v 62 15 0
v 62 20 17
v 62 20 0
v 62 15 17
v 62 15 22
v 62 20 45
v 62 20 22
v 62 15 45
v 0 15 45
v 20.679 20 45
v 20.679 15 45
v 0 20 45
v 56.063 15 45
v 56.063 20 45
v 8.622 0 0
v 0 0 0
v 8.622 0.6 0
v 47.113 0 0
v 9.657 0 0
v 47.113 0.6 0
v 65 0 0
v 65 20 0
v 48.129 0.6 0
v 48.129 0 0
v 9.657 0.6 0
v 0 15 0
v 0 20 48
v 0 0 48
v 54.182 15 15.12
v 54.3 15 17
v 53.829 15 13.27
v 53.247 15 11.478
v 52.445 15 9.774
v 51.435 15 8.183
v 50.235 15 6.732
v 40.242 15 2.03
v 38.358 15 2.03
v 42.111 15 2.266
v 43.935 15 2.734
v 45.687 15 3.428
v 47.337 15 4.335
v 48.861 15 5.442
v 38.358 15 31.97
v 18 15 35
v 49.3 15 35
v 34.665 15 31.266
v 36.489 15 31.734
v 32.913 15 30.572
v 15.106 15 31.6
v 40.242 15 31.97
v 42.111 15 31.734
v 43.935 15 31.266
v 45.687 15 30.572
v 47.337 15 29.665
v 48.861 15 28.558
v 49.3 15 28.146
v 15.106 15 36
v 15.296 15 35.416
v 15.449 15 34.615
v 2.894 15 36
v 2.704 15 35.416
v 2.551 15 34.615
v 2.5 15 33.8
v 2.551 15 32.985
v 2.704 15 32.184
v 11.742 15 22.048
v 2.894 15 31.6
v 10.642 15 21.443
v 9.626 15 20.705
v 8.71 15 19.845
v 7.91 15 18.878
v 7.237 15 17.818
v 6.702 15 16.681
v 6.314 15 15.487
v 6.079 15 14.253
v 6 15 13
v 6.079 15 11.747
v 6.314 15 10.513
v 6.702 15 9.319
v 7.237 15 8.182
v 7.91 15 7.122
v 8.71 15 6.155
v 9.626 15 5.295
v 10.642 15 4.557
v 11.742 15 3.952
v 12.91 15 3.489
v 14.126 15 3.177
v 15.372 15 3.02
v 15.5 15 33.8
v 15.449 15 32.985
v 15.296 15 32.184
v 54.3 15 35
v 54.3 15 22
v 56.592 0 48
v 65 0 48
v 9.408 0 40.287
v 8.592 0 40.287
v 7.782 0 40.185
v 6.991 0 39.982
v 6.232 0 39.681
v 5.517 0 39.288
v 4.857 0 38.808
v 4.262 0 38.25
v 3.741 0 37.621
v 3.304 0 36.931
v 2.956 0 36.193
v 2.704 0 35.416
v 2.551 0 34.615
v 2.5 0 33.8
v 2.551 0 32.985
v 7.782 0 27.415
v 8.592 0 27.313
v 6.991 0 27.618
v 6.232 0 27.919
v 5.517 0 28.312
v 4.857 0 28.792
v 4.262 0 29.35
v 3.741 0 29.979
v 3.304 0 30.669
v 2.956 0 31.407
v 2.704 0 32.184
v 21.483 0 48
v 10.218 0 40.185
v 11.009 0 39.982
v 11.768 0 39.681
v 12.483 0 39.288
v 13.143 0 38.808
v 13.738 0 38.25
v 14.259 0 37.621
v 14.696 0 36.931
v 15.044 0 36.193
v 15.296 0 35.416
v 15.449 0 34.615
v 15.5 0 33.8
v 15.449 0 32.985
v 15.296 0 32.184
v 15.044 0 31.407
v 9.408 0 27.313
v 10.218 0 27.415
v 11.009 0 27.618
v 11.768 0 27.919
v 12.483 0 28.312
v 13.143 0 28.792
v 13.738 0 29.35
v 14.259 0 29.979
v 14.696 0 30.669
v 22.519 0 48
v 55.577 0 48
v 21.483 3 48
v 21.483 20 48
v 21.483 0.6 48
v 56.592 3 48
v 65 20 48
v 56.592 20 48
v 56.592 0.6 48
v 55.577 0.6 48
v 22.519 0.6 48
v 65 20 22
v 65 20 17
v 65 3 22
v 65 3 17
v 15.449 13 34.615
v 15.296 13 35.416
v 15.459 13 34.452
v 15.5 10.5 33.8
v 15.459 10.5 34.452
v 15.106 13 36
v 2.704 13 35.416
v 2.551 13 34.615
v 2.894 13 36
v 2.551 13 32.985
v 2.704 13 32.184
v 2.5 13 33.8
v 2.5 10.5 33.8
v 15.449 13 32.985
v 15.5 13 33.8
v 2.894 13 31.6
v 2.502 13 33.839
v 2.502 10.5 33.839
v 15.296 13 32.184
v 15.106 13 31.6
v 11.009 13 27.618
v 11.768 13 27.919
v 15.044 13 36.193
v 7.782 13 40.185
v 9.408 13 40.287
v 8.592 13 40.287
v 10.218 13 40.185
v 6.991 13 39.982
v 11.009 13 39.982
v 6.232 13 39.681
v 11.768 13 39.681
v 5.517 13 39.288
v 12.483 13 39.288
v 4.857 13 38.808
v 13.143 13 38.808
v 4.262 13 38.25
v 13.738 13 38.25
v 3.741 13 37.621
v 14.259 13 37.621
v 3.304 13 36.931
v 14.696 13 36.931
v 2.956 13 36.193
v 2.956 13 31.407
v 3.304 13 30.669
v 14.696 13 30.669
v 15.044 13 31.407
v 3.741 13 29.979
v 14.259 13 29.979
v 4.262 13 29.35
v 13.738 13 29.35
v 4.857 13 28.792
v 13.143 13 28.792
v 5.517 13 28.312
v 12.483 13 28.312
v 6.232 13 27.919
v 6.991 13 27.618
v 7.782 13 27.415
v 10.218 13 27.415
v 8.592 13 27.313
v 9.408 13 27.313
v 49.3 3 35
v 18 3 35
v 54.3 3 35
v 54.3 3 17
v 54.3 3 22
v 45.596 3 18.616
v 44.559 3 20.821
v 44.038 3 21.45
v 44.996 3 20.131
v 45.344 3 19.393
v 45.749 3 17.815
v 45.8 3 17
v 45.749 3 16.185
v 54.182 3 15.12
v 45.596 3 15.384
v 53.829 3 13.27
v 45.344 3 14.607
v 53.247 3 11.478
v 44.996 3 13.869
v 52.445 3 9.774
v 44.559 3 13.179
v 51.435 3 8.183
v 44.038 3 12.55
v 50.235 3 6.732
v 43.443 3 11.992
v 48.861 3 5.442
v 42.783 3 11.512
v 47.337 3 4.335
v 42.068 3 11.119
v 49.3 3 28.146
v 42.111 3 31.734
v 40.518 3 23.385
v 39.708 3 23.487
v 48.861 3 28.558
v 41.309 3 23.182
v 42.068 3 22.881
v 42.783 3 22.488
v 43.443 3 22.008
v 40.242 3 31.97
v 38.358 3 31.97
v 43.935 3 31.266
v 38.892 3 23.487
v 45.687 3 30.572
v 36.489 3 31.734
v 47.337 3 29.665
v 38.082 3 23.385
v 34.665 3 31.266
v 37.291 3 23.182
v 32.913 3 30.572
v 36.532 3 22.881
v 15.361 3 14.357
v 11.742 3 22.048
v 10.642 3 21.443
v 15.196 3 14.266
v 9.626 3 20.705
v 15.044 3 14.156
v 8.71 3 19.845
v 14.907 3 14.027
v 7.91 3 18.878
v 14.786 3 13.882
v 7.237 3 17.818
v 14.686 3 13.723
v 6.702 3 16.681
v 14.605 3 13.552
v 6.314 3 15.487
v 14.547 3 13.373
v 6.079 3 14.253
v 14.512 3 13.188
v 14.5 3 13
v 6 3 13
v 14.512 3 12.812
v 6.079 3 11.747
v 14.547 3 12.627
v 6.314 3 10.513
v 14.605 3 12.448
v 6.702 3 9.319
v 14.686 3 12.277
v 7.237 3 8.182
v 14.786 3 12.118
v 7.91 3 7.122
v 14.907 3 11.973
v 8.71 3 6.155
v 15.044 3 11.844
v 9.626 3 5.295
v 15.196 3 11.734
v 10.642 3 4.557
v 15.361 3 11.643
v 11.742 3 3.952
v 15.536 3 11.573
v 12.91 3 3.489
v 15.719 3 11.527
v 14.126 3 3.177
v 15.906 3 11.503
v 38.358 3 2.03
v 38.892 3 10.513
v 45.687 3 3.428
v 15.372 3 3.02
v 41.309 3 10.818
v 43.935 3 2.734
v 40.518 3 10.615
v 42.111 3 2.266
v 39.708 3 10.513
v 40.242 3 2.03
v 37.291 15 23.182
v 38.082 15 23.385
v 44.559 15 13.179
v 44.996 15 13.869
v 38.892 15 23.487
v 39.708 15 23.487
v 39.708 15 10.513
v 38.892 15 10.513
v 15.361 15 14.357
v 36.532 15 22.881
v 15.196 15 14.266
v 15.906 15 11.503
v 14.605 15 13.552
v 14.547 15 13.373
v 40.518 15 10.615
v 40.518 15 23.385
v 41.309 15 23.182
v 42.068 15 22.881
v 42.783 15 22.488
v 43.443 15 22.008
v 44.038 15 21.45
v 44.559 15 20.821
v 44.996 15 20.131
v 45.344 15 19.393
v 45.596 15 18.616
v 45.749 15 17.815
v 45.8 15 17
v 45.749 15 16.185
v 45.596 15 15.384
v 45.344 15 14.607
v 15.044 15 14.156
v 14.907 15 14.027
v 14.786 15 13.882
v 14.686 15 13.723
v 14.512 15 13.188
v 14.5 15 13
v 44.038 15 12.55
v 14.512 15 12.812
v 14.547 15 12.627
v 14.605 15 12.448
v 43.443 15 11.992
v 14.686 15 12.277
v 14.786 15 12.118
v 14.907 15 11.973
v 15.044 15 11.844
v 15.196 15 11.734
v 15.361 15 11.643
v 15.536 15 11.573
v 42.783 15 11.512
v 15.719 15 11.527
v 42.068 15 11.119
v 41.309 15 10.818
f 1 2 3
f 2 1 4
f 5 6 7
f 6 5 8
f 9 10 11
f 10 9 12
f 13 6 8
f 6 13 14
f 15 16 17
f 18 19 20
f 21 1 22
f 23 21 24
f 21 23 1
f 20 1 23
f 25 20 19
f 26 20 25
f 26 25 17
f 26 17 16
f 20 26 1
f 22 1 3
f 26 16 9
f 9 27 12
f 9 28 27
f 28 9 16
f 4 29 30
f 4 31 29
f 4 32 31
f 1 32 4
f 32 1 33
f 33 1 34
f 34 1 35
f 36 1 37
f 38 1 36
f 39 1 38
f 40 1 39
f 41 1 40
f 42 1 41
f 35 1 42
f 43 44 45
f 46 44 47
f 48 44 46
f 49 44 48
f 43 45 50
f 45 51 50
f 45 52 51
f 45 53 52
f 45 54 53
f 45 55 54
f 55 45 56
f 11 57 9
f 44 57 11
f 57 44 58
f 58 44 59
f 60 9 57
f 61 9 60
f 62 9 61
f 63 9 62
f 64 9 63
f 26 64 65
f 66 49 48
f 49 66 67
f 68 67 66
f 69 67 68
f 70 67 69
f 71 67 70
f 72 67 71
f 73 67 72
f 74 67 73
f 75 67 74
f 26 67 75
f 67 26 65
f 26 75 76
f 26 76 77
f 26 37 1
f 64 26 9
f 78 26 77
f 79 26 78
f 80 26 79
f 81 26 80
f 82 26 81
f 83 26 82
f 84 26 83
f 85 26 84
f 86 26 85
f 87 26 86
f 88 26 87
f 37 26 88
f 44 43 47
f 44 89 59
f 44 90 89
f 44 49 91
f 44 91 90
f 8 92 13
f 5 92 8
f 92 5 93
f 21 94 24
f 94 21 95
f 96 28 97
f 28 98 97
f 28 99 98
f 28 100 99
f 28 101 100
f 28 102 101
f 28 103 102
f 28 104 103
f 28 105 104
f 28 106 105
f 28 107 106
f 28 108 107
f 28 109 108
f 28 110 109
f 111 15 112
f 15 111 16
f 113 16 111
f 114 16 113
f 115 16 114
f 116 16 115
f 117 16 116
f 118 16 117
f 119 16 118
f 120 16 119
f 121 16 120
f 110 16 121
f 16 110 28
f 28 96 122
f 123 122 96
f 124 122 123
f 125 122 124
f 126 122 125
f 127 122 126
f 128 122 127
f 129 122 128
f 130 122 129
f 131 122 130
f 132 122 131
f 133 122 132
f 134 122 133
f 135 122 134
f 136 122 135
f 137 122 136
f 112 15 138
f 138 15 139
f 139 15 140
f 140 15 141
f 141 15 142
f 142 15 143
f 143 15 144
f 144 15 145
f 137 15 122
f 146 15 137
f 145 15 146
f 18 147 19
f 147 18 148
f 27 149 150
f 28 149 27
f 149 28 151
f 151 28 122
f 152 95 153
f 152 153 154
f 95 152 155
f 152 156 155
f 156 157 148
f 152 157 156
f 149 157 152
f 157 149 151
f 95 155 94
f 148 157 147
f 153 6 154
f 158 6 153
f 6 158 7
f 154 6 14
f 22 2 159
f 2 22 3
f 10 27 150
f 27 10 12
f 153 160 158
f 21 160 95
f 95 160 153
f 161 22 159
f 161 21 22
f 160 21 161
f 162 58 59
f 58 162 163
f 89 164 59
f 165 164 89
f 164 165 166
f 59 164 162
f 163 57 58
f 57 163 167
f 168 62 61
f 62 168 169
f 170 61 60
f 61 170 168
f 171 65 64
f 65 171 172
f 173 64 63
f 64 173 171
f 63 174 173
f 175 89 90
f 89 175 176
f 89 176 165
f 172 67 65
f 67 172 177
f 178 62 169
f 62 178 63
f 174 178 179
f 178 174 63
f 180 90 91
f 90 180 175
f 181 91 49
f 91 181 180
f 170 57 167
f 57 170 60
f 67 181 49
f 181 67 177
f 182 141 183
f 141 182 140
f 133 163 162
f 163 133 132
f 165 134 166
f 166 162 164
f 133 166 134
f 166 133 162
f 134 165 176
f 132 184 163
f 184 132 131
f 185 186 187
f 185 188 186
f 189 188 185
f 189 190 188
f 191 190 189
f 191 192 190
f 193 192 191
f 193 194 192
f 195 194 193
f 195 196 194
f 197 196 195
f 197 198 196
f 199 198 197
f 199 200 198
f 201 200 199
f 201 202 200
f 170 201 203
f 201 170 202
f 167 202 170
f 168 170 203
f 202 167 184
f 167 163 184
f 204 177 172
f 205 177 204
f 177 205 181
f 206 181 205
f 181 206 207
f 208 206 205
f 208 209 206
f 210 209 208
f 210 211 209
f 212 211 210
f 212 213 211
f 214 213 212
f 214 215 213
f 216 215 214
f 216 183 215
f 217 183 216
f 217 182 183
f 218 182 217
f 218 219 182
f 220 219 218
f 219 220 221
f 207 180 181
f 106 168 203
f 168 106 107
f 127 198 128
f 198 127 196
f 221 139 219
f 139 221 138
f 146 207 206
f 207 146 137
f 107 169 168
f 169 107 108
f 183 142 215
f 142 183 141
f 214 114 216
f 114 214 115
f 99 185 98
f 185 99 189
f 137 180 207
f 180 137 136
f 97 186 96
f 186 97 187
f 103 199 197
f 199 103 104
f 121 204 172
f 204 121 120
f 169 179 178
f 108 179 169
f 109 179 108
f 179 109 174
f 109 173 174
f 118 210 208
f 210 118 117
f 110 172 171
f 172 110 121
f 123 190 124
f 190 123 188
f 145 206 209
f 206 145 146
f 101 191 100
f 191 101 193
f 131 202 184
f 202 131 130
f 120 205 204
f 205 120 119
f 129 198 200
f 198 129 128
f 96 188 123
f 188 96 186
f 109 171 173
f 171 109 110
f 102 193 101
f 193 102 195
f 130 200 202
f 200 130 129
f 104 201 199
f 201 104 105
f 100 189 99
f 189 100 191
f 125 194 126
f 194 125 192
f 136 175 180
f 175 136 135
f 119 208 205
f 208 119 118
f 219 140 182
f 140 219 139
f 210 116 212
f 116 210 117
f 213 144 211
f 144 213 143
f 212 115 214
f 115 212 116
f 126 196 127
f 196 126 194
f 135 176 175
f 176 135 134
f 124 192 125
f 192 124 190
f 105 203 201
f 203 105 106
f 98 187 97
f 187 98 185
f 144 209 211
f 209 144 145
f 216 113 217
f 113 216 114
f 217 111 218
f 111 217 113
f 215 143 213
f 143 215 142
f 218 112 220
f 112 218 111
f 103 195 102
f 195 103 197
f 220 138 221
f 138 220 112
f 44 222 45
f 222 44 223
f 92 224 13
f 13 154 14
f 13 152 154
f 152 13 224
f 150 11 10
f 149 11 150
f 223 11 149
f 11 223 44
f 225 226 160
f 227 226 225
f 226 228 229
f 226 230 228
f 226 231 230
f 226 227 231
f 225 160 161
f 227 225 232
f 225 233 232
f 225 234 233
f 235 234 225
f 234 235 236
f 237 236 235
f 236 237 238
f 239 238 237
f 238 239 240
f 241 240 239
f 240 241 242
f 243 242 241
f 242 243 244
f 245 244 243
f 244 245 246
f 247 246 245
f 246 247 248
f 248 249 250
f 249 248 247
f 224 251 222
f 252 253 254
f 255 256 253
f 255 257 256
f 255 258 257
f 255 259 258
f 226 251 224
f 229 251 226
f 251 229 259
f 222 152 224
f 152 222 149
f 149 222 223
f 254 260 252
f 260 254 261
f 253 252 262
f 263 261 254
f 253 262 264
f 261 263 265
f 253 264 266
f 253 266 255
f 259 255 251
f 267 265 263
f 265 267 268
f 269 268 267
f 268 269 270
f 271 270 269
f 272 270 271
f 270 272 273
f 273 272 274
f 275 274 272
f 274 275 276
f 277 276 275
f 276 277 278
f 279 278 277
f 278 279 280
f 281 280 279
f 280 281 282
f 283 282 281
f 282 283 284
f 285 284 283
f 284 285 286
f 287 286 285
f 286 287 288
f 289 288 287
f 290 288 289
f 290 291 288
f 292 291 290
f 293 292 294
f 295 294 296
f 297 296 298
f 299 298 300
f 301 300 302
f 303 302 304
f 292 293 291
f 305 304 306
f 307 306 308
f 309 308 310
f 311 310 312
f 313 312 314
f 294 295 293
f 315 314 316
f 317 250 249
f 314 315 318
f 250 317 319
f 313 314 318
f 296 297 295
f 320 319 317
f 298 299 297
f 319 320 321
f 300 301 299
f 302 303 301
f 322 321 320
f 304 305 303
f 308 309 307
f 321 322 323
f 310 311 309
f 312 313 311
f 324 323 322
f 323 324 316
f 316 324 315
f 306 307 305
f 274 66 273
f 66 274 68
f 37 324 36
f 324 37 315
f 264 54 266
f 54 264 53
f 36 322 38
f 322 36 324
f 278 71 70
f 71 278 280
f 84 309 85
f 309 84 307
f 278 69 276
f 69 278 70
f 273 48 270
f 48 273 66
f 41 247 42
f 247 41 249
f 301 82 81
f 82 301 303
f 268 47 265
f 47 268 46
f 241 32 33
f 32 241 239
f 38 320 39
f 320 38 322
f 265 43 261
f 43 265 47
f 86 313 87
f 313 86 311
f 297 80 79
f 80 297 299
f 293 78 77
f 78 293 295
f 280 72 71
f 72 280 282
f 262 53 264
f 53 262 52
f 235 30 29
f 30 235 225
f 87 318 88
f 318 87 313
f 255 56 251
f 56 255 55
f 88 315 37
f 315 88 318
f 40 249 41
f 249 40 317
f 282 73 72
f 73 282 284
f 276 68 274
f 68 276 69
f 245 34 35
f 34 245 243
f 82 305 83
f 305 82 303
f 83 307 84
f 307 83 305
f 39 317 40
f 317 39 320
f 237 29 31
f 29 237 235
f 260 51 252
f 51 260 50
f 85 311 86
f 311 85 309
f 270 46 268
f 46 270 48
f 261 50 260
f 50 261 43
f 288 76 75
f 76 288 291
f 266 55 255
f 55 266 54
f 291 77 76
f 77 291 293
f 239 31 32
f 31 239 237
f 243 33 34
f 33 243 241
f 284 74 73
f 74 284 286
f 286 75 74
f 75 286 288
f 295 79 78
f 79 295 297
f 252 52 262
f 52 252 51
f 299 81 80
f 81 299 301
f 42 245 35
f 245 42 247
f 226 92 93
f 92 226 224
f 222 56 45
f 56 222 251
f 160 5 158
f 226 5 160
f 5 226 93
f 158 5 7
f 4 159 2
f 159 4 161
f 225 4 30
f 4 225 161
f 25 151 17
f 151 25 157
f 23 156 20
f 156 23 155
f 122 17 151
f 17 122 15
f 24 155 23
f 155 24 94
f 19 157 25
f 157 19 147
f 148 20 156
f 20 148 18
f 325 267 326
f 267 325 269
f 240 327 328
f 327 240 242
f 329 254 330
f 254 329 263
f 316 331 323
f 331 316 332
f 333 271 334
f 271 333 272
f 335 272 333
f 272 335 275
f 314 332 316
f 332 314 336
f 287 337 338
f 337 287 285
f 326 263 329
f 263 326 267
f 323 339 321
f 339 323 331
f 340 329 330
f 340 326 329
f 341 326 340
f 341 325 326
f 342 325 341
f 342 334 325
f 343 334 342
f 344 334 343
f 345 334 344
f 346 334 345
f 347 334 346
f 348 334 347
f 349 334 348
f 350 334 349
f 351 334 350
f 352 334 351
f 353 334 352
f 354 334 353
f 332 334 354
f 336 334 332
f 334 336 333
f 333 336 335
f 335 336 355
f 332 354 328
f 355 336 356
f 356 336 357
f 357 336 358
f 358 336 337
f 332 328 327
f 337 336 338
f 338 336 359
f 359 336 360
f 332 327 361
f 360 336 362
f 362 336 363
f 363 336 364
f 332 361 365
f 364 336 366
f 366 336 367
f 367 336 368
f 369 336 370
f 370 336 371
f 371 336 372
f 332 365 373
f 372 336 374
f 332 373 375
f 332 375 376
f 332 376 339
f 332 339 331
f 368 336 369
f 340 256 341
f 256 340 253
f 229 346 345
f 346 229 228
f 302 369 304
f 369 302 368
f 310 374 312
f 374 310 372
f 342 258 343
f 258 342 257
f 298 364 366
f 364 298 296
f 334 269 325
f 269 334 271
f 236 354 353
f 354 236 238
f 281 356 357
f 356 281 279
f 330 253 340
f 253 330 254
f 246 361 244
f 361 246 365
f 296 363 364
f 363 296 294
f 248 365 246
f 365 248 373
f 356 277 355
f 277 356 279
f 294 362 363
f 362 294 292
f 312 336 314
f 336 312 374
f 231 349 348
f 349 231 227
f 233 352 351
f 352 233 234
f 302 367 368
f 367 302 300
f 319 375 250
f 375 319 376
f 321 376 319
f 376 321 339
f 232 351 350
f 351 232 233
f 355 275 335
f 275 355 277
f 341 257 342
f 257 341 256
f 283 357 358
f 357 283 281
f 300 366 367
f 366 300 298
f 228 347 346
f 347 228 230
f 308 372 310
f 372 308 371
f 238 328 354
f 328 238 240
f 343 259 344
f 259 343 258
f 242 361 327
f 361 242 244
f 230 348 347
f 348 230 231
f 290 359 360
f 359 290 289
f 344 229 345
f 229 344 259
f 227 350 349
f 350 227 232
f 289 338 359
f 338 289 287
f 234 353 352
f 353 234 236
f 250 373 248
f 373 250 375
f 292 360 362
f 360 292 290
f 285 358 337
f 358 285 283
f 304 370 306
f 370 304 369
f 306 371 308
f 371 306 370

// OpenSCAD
$fn = 50;

thickness = 3.0;
screw_cap_r = 6.0;
screw_cap_h = 7.4;
screw_thread_r = 1.7;
screw_thread_h = 11.1 - screw_cap_h;
screw_cap_tolerance = 0.5;
screw_hole_y = 11.2;
screw_hole_receiver = 2.0;

box_x = 62.0;
box_y = 12.25 + thickness;
box_z = 45.0;

lip_overhang = 5.0;

antenna_tolerance = 0.5;
antenna_x = 35.8 + antenna_tolerance;
antenna_y = 12.0;
antenna_z = 150.0;
antenna_recess = 10.0;

channel_width = 5.0;
spool_r = 15.0;
spool_channel_width = 8.5;

antenna_points = [
    [0, 0],
    [antenna_x, 0],
    [antenna_x + antenna_z / tan(80), antenna_z],
    [antenna_z / tan(75), antenna_z],
];

antenna_projection_points = [
    [antenna_z / tan(75), antenna_z],
    [antenna_x + antenna_z / tan(80), antenna_z],
    [antenna_x - antenna_z / tan(80), -antenna_z],
    [-antenna_z / tan(75), -antenna_z],
];

module screw() {
    rotate([0, 90, -90]) union() {
        cylinder(h=screw_thread_h, r=screw_thread_r);
        translate([0, 0, screw_thread_h]) cylinder(h=screw_cap_h, r=screw_cap_r, center=false);
    }
}

module antenna() {
    rotate([90, 0, 0])
        translate([0, 0, -antenna_y])
        linear_extrude(height=antenna_y)
        polygon(points=antenna_points);
}

module case() {
    difference() {
        union() {
            // Main box
            cube([box_x, antenna_y + thickness, box_z]);

            // Top lip
            translate([0, 0, box_z])
                cube([box_x, antenna_y + thickness + lip_overhang, thickness]);

            // Side lip
            translate([box_x, 0, 0])
                cube([thickness, antenna_y + thickness + lip_overhang, box_z + thickness]);
        }

        // Recess for case screw
        translate([thickness + screw_cap_r, antenna_y + thickness - screw_hole_receiver, box_z - screw_hole_y])
            rotate([90, 0, 0])
            cylinder(r=(screw_cap_r + screw_cap_tolerance), h=(antenna_y + thickness));

        // Hole for case screw. This is a slot instead of a circle to help out
        // the slicer (Prusa Slicer at least tries to path a circle in
        // mid-air).
        translate([thickness + screw_cap_r, antenna_y + 2 * thickness, box_z - screw_hole_y])
            intersection() {
                rotate([90, 0, 0]) cylinder(r=(screw_cap_r + screw_cap_tolerance), h=(antenna_y + thickness));
                cube([2 * (screw_cap_r + screw_cap_tolerance), antenna_y + thickness, 2 * (screw_thread_r + screw_cap_tolerance)], center=true);
            };

        // Screw (view only)
        *translate([thickness + screw_cap_r, antenna_y + thickness - screw_hole_receiver + screw_thread_h, box_z - screw_hole_y])
            screw();

        // Antenna cutout
        translate([2 * thickness + 2 * screw_cap_r, thickness, box_z - antenna_recess])
            scale([1, 2, 1])
            antenna();

        // Antenna (view only)
        %translate([2 * thickness + 2 * screw_cap_r, thickness, box_z - antenna_recess])
            antenna();

        // Cable spool cutout
        hull() {
            translate([2 * thickness + 2 * screw_cap_r + antenna_x - spool_r, thickness, box_z - antenna_recess - thickness - spool_r])
                rotate([-90, 0, 0])
                cylinder(r=spool_r, h=antenna_y * 2);
            translate([2 * thickness + (2 * spool_r / 3), thickness, thickness + 2 * spool_r / 3])
                rotate([-90, 0, 0])
                cylinder(r=(2 * spool_r / 3), h=antenna_y * 2);
        }

        // Channel from antenna to spool
        translate([2 * thickness + 2 * screw_cap_r + antenna_x - channel_width, thickness, box_z - antenna_recess - thickness - spool_r])
            scale([1, 2, 1])
            cube([channel_width, antenna_y, box_z]);

        // Channel from spool to back
        translate([2 * thickness + 2 * screw_cap_r + antenna_x - spool_r, thickness, box_z - antenna_recess - thickness - spool_r])
            scale([1, 2, 1])
            cube([box_x, antenna_y, channel_width]);

        // Decorate the front at the same angle as the antenna
        translate([2 * thickness + 2 * screw_cap_r, 0.6, box_z - antenna_recess])
            rotate([90, 0, 0])
            linear_extrude(height=antenna_y)
            difference() {
                polygon(points=antenna_projection_points);
                offset(delta=-1) polygon(points=antenna_projection_points);
            };
    }

    // Center pegs for wrapping cable around.
    hull() {
        translate([2 * thickness + 2 * screw_cap_r + antenna_x - spool_r, thickness, box_z - antenna_recess - thickness - spool_r])
            rotate([-90, 0, 0])
            cylinder(r=(spool_r - spool_channel_width), h=antenna_y);
        translate([2 * thickness + (2 * spool_r / 3), thickness, thickness + 2 * spool_r / 3])
            rotate([-90, 0, 0])
            cylinder(r=((2 * spool_r / 3) - spool_channel_width), h=antenna_y);
    }
}

// Rotate when exporting so correct face is down in STL
//rotate([90, 0, 90]) case();

case();
